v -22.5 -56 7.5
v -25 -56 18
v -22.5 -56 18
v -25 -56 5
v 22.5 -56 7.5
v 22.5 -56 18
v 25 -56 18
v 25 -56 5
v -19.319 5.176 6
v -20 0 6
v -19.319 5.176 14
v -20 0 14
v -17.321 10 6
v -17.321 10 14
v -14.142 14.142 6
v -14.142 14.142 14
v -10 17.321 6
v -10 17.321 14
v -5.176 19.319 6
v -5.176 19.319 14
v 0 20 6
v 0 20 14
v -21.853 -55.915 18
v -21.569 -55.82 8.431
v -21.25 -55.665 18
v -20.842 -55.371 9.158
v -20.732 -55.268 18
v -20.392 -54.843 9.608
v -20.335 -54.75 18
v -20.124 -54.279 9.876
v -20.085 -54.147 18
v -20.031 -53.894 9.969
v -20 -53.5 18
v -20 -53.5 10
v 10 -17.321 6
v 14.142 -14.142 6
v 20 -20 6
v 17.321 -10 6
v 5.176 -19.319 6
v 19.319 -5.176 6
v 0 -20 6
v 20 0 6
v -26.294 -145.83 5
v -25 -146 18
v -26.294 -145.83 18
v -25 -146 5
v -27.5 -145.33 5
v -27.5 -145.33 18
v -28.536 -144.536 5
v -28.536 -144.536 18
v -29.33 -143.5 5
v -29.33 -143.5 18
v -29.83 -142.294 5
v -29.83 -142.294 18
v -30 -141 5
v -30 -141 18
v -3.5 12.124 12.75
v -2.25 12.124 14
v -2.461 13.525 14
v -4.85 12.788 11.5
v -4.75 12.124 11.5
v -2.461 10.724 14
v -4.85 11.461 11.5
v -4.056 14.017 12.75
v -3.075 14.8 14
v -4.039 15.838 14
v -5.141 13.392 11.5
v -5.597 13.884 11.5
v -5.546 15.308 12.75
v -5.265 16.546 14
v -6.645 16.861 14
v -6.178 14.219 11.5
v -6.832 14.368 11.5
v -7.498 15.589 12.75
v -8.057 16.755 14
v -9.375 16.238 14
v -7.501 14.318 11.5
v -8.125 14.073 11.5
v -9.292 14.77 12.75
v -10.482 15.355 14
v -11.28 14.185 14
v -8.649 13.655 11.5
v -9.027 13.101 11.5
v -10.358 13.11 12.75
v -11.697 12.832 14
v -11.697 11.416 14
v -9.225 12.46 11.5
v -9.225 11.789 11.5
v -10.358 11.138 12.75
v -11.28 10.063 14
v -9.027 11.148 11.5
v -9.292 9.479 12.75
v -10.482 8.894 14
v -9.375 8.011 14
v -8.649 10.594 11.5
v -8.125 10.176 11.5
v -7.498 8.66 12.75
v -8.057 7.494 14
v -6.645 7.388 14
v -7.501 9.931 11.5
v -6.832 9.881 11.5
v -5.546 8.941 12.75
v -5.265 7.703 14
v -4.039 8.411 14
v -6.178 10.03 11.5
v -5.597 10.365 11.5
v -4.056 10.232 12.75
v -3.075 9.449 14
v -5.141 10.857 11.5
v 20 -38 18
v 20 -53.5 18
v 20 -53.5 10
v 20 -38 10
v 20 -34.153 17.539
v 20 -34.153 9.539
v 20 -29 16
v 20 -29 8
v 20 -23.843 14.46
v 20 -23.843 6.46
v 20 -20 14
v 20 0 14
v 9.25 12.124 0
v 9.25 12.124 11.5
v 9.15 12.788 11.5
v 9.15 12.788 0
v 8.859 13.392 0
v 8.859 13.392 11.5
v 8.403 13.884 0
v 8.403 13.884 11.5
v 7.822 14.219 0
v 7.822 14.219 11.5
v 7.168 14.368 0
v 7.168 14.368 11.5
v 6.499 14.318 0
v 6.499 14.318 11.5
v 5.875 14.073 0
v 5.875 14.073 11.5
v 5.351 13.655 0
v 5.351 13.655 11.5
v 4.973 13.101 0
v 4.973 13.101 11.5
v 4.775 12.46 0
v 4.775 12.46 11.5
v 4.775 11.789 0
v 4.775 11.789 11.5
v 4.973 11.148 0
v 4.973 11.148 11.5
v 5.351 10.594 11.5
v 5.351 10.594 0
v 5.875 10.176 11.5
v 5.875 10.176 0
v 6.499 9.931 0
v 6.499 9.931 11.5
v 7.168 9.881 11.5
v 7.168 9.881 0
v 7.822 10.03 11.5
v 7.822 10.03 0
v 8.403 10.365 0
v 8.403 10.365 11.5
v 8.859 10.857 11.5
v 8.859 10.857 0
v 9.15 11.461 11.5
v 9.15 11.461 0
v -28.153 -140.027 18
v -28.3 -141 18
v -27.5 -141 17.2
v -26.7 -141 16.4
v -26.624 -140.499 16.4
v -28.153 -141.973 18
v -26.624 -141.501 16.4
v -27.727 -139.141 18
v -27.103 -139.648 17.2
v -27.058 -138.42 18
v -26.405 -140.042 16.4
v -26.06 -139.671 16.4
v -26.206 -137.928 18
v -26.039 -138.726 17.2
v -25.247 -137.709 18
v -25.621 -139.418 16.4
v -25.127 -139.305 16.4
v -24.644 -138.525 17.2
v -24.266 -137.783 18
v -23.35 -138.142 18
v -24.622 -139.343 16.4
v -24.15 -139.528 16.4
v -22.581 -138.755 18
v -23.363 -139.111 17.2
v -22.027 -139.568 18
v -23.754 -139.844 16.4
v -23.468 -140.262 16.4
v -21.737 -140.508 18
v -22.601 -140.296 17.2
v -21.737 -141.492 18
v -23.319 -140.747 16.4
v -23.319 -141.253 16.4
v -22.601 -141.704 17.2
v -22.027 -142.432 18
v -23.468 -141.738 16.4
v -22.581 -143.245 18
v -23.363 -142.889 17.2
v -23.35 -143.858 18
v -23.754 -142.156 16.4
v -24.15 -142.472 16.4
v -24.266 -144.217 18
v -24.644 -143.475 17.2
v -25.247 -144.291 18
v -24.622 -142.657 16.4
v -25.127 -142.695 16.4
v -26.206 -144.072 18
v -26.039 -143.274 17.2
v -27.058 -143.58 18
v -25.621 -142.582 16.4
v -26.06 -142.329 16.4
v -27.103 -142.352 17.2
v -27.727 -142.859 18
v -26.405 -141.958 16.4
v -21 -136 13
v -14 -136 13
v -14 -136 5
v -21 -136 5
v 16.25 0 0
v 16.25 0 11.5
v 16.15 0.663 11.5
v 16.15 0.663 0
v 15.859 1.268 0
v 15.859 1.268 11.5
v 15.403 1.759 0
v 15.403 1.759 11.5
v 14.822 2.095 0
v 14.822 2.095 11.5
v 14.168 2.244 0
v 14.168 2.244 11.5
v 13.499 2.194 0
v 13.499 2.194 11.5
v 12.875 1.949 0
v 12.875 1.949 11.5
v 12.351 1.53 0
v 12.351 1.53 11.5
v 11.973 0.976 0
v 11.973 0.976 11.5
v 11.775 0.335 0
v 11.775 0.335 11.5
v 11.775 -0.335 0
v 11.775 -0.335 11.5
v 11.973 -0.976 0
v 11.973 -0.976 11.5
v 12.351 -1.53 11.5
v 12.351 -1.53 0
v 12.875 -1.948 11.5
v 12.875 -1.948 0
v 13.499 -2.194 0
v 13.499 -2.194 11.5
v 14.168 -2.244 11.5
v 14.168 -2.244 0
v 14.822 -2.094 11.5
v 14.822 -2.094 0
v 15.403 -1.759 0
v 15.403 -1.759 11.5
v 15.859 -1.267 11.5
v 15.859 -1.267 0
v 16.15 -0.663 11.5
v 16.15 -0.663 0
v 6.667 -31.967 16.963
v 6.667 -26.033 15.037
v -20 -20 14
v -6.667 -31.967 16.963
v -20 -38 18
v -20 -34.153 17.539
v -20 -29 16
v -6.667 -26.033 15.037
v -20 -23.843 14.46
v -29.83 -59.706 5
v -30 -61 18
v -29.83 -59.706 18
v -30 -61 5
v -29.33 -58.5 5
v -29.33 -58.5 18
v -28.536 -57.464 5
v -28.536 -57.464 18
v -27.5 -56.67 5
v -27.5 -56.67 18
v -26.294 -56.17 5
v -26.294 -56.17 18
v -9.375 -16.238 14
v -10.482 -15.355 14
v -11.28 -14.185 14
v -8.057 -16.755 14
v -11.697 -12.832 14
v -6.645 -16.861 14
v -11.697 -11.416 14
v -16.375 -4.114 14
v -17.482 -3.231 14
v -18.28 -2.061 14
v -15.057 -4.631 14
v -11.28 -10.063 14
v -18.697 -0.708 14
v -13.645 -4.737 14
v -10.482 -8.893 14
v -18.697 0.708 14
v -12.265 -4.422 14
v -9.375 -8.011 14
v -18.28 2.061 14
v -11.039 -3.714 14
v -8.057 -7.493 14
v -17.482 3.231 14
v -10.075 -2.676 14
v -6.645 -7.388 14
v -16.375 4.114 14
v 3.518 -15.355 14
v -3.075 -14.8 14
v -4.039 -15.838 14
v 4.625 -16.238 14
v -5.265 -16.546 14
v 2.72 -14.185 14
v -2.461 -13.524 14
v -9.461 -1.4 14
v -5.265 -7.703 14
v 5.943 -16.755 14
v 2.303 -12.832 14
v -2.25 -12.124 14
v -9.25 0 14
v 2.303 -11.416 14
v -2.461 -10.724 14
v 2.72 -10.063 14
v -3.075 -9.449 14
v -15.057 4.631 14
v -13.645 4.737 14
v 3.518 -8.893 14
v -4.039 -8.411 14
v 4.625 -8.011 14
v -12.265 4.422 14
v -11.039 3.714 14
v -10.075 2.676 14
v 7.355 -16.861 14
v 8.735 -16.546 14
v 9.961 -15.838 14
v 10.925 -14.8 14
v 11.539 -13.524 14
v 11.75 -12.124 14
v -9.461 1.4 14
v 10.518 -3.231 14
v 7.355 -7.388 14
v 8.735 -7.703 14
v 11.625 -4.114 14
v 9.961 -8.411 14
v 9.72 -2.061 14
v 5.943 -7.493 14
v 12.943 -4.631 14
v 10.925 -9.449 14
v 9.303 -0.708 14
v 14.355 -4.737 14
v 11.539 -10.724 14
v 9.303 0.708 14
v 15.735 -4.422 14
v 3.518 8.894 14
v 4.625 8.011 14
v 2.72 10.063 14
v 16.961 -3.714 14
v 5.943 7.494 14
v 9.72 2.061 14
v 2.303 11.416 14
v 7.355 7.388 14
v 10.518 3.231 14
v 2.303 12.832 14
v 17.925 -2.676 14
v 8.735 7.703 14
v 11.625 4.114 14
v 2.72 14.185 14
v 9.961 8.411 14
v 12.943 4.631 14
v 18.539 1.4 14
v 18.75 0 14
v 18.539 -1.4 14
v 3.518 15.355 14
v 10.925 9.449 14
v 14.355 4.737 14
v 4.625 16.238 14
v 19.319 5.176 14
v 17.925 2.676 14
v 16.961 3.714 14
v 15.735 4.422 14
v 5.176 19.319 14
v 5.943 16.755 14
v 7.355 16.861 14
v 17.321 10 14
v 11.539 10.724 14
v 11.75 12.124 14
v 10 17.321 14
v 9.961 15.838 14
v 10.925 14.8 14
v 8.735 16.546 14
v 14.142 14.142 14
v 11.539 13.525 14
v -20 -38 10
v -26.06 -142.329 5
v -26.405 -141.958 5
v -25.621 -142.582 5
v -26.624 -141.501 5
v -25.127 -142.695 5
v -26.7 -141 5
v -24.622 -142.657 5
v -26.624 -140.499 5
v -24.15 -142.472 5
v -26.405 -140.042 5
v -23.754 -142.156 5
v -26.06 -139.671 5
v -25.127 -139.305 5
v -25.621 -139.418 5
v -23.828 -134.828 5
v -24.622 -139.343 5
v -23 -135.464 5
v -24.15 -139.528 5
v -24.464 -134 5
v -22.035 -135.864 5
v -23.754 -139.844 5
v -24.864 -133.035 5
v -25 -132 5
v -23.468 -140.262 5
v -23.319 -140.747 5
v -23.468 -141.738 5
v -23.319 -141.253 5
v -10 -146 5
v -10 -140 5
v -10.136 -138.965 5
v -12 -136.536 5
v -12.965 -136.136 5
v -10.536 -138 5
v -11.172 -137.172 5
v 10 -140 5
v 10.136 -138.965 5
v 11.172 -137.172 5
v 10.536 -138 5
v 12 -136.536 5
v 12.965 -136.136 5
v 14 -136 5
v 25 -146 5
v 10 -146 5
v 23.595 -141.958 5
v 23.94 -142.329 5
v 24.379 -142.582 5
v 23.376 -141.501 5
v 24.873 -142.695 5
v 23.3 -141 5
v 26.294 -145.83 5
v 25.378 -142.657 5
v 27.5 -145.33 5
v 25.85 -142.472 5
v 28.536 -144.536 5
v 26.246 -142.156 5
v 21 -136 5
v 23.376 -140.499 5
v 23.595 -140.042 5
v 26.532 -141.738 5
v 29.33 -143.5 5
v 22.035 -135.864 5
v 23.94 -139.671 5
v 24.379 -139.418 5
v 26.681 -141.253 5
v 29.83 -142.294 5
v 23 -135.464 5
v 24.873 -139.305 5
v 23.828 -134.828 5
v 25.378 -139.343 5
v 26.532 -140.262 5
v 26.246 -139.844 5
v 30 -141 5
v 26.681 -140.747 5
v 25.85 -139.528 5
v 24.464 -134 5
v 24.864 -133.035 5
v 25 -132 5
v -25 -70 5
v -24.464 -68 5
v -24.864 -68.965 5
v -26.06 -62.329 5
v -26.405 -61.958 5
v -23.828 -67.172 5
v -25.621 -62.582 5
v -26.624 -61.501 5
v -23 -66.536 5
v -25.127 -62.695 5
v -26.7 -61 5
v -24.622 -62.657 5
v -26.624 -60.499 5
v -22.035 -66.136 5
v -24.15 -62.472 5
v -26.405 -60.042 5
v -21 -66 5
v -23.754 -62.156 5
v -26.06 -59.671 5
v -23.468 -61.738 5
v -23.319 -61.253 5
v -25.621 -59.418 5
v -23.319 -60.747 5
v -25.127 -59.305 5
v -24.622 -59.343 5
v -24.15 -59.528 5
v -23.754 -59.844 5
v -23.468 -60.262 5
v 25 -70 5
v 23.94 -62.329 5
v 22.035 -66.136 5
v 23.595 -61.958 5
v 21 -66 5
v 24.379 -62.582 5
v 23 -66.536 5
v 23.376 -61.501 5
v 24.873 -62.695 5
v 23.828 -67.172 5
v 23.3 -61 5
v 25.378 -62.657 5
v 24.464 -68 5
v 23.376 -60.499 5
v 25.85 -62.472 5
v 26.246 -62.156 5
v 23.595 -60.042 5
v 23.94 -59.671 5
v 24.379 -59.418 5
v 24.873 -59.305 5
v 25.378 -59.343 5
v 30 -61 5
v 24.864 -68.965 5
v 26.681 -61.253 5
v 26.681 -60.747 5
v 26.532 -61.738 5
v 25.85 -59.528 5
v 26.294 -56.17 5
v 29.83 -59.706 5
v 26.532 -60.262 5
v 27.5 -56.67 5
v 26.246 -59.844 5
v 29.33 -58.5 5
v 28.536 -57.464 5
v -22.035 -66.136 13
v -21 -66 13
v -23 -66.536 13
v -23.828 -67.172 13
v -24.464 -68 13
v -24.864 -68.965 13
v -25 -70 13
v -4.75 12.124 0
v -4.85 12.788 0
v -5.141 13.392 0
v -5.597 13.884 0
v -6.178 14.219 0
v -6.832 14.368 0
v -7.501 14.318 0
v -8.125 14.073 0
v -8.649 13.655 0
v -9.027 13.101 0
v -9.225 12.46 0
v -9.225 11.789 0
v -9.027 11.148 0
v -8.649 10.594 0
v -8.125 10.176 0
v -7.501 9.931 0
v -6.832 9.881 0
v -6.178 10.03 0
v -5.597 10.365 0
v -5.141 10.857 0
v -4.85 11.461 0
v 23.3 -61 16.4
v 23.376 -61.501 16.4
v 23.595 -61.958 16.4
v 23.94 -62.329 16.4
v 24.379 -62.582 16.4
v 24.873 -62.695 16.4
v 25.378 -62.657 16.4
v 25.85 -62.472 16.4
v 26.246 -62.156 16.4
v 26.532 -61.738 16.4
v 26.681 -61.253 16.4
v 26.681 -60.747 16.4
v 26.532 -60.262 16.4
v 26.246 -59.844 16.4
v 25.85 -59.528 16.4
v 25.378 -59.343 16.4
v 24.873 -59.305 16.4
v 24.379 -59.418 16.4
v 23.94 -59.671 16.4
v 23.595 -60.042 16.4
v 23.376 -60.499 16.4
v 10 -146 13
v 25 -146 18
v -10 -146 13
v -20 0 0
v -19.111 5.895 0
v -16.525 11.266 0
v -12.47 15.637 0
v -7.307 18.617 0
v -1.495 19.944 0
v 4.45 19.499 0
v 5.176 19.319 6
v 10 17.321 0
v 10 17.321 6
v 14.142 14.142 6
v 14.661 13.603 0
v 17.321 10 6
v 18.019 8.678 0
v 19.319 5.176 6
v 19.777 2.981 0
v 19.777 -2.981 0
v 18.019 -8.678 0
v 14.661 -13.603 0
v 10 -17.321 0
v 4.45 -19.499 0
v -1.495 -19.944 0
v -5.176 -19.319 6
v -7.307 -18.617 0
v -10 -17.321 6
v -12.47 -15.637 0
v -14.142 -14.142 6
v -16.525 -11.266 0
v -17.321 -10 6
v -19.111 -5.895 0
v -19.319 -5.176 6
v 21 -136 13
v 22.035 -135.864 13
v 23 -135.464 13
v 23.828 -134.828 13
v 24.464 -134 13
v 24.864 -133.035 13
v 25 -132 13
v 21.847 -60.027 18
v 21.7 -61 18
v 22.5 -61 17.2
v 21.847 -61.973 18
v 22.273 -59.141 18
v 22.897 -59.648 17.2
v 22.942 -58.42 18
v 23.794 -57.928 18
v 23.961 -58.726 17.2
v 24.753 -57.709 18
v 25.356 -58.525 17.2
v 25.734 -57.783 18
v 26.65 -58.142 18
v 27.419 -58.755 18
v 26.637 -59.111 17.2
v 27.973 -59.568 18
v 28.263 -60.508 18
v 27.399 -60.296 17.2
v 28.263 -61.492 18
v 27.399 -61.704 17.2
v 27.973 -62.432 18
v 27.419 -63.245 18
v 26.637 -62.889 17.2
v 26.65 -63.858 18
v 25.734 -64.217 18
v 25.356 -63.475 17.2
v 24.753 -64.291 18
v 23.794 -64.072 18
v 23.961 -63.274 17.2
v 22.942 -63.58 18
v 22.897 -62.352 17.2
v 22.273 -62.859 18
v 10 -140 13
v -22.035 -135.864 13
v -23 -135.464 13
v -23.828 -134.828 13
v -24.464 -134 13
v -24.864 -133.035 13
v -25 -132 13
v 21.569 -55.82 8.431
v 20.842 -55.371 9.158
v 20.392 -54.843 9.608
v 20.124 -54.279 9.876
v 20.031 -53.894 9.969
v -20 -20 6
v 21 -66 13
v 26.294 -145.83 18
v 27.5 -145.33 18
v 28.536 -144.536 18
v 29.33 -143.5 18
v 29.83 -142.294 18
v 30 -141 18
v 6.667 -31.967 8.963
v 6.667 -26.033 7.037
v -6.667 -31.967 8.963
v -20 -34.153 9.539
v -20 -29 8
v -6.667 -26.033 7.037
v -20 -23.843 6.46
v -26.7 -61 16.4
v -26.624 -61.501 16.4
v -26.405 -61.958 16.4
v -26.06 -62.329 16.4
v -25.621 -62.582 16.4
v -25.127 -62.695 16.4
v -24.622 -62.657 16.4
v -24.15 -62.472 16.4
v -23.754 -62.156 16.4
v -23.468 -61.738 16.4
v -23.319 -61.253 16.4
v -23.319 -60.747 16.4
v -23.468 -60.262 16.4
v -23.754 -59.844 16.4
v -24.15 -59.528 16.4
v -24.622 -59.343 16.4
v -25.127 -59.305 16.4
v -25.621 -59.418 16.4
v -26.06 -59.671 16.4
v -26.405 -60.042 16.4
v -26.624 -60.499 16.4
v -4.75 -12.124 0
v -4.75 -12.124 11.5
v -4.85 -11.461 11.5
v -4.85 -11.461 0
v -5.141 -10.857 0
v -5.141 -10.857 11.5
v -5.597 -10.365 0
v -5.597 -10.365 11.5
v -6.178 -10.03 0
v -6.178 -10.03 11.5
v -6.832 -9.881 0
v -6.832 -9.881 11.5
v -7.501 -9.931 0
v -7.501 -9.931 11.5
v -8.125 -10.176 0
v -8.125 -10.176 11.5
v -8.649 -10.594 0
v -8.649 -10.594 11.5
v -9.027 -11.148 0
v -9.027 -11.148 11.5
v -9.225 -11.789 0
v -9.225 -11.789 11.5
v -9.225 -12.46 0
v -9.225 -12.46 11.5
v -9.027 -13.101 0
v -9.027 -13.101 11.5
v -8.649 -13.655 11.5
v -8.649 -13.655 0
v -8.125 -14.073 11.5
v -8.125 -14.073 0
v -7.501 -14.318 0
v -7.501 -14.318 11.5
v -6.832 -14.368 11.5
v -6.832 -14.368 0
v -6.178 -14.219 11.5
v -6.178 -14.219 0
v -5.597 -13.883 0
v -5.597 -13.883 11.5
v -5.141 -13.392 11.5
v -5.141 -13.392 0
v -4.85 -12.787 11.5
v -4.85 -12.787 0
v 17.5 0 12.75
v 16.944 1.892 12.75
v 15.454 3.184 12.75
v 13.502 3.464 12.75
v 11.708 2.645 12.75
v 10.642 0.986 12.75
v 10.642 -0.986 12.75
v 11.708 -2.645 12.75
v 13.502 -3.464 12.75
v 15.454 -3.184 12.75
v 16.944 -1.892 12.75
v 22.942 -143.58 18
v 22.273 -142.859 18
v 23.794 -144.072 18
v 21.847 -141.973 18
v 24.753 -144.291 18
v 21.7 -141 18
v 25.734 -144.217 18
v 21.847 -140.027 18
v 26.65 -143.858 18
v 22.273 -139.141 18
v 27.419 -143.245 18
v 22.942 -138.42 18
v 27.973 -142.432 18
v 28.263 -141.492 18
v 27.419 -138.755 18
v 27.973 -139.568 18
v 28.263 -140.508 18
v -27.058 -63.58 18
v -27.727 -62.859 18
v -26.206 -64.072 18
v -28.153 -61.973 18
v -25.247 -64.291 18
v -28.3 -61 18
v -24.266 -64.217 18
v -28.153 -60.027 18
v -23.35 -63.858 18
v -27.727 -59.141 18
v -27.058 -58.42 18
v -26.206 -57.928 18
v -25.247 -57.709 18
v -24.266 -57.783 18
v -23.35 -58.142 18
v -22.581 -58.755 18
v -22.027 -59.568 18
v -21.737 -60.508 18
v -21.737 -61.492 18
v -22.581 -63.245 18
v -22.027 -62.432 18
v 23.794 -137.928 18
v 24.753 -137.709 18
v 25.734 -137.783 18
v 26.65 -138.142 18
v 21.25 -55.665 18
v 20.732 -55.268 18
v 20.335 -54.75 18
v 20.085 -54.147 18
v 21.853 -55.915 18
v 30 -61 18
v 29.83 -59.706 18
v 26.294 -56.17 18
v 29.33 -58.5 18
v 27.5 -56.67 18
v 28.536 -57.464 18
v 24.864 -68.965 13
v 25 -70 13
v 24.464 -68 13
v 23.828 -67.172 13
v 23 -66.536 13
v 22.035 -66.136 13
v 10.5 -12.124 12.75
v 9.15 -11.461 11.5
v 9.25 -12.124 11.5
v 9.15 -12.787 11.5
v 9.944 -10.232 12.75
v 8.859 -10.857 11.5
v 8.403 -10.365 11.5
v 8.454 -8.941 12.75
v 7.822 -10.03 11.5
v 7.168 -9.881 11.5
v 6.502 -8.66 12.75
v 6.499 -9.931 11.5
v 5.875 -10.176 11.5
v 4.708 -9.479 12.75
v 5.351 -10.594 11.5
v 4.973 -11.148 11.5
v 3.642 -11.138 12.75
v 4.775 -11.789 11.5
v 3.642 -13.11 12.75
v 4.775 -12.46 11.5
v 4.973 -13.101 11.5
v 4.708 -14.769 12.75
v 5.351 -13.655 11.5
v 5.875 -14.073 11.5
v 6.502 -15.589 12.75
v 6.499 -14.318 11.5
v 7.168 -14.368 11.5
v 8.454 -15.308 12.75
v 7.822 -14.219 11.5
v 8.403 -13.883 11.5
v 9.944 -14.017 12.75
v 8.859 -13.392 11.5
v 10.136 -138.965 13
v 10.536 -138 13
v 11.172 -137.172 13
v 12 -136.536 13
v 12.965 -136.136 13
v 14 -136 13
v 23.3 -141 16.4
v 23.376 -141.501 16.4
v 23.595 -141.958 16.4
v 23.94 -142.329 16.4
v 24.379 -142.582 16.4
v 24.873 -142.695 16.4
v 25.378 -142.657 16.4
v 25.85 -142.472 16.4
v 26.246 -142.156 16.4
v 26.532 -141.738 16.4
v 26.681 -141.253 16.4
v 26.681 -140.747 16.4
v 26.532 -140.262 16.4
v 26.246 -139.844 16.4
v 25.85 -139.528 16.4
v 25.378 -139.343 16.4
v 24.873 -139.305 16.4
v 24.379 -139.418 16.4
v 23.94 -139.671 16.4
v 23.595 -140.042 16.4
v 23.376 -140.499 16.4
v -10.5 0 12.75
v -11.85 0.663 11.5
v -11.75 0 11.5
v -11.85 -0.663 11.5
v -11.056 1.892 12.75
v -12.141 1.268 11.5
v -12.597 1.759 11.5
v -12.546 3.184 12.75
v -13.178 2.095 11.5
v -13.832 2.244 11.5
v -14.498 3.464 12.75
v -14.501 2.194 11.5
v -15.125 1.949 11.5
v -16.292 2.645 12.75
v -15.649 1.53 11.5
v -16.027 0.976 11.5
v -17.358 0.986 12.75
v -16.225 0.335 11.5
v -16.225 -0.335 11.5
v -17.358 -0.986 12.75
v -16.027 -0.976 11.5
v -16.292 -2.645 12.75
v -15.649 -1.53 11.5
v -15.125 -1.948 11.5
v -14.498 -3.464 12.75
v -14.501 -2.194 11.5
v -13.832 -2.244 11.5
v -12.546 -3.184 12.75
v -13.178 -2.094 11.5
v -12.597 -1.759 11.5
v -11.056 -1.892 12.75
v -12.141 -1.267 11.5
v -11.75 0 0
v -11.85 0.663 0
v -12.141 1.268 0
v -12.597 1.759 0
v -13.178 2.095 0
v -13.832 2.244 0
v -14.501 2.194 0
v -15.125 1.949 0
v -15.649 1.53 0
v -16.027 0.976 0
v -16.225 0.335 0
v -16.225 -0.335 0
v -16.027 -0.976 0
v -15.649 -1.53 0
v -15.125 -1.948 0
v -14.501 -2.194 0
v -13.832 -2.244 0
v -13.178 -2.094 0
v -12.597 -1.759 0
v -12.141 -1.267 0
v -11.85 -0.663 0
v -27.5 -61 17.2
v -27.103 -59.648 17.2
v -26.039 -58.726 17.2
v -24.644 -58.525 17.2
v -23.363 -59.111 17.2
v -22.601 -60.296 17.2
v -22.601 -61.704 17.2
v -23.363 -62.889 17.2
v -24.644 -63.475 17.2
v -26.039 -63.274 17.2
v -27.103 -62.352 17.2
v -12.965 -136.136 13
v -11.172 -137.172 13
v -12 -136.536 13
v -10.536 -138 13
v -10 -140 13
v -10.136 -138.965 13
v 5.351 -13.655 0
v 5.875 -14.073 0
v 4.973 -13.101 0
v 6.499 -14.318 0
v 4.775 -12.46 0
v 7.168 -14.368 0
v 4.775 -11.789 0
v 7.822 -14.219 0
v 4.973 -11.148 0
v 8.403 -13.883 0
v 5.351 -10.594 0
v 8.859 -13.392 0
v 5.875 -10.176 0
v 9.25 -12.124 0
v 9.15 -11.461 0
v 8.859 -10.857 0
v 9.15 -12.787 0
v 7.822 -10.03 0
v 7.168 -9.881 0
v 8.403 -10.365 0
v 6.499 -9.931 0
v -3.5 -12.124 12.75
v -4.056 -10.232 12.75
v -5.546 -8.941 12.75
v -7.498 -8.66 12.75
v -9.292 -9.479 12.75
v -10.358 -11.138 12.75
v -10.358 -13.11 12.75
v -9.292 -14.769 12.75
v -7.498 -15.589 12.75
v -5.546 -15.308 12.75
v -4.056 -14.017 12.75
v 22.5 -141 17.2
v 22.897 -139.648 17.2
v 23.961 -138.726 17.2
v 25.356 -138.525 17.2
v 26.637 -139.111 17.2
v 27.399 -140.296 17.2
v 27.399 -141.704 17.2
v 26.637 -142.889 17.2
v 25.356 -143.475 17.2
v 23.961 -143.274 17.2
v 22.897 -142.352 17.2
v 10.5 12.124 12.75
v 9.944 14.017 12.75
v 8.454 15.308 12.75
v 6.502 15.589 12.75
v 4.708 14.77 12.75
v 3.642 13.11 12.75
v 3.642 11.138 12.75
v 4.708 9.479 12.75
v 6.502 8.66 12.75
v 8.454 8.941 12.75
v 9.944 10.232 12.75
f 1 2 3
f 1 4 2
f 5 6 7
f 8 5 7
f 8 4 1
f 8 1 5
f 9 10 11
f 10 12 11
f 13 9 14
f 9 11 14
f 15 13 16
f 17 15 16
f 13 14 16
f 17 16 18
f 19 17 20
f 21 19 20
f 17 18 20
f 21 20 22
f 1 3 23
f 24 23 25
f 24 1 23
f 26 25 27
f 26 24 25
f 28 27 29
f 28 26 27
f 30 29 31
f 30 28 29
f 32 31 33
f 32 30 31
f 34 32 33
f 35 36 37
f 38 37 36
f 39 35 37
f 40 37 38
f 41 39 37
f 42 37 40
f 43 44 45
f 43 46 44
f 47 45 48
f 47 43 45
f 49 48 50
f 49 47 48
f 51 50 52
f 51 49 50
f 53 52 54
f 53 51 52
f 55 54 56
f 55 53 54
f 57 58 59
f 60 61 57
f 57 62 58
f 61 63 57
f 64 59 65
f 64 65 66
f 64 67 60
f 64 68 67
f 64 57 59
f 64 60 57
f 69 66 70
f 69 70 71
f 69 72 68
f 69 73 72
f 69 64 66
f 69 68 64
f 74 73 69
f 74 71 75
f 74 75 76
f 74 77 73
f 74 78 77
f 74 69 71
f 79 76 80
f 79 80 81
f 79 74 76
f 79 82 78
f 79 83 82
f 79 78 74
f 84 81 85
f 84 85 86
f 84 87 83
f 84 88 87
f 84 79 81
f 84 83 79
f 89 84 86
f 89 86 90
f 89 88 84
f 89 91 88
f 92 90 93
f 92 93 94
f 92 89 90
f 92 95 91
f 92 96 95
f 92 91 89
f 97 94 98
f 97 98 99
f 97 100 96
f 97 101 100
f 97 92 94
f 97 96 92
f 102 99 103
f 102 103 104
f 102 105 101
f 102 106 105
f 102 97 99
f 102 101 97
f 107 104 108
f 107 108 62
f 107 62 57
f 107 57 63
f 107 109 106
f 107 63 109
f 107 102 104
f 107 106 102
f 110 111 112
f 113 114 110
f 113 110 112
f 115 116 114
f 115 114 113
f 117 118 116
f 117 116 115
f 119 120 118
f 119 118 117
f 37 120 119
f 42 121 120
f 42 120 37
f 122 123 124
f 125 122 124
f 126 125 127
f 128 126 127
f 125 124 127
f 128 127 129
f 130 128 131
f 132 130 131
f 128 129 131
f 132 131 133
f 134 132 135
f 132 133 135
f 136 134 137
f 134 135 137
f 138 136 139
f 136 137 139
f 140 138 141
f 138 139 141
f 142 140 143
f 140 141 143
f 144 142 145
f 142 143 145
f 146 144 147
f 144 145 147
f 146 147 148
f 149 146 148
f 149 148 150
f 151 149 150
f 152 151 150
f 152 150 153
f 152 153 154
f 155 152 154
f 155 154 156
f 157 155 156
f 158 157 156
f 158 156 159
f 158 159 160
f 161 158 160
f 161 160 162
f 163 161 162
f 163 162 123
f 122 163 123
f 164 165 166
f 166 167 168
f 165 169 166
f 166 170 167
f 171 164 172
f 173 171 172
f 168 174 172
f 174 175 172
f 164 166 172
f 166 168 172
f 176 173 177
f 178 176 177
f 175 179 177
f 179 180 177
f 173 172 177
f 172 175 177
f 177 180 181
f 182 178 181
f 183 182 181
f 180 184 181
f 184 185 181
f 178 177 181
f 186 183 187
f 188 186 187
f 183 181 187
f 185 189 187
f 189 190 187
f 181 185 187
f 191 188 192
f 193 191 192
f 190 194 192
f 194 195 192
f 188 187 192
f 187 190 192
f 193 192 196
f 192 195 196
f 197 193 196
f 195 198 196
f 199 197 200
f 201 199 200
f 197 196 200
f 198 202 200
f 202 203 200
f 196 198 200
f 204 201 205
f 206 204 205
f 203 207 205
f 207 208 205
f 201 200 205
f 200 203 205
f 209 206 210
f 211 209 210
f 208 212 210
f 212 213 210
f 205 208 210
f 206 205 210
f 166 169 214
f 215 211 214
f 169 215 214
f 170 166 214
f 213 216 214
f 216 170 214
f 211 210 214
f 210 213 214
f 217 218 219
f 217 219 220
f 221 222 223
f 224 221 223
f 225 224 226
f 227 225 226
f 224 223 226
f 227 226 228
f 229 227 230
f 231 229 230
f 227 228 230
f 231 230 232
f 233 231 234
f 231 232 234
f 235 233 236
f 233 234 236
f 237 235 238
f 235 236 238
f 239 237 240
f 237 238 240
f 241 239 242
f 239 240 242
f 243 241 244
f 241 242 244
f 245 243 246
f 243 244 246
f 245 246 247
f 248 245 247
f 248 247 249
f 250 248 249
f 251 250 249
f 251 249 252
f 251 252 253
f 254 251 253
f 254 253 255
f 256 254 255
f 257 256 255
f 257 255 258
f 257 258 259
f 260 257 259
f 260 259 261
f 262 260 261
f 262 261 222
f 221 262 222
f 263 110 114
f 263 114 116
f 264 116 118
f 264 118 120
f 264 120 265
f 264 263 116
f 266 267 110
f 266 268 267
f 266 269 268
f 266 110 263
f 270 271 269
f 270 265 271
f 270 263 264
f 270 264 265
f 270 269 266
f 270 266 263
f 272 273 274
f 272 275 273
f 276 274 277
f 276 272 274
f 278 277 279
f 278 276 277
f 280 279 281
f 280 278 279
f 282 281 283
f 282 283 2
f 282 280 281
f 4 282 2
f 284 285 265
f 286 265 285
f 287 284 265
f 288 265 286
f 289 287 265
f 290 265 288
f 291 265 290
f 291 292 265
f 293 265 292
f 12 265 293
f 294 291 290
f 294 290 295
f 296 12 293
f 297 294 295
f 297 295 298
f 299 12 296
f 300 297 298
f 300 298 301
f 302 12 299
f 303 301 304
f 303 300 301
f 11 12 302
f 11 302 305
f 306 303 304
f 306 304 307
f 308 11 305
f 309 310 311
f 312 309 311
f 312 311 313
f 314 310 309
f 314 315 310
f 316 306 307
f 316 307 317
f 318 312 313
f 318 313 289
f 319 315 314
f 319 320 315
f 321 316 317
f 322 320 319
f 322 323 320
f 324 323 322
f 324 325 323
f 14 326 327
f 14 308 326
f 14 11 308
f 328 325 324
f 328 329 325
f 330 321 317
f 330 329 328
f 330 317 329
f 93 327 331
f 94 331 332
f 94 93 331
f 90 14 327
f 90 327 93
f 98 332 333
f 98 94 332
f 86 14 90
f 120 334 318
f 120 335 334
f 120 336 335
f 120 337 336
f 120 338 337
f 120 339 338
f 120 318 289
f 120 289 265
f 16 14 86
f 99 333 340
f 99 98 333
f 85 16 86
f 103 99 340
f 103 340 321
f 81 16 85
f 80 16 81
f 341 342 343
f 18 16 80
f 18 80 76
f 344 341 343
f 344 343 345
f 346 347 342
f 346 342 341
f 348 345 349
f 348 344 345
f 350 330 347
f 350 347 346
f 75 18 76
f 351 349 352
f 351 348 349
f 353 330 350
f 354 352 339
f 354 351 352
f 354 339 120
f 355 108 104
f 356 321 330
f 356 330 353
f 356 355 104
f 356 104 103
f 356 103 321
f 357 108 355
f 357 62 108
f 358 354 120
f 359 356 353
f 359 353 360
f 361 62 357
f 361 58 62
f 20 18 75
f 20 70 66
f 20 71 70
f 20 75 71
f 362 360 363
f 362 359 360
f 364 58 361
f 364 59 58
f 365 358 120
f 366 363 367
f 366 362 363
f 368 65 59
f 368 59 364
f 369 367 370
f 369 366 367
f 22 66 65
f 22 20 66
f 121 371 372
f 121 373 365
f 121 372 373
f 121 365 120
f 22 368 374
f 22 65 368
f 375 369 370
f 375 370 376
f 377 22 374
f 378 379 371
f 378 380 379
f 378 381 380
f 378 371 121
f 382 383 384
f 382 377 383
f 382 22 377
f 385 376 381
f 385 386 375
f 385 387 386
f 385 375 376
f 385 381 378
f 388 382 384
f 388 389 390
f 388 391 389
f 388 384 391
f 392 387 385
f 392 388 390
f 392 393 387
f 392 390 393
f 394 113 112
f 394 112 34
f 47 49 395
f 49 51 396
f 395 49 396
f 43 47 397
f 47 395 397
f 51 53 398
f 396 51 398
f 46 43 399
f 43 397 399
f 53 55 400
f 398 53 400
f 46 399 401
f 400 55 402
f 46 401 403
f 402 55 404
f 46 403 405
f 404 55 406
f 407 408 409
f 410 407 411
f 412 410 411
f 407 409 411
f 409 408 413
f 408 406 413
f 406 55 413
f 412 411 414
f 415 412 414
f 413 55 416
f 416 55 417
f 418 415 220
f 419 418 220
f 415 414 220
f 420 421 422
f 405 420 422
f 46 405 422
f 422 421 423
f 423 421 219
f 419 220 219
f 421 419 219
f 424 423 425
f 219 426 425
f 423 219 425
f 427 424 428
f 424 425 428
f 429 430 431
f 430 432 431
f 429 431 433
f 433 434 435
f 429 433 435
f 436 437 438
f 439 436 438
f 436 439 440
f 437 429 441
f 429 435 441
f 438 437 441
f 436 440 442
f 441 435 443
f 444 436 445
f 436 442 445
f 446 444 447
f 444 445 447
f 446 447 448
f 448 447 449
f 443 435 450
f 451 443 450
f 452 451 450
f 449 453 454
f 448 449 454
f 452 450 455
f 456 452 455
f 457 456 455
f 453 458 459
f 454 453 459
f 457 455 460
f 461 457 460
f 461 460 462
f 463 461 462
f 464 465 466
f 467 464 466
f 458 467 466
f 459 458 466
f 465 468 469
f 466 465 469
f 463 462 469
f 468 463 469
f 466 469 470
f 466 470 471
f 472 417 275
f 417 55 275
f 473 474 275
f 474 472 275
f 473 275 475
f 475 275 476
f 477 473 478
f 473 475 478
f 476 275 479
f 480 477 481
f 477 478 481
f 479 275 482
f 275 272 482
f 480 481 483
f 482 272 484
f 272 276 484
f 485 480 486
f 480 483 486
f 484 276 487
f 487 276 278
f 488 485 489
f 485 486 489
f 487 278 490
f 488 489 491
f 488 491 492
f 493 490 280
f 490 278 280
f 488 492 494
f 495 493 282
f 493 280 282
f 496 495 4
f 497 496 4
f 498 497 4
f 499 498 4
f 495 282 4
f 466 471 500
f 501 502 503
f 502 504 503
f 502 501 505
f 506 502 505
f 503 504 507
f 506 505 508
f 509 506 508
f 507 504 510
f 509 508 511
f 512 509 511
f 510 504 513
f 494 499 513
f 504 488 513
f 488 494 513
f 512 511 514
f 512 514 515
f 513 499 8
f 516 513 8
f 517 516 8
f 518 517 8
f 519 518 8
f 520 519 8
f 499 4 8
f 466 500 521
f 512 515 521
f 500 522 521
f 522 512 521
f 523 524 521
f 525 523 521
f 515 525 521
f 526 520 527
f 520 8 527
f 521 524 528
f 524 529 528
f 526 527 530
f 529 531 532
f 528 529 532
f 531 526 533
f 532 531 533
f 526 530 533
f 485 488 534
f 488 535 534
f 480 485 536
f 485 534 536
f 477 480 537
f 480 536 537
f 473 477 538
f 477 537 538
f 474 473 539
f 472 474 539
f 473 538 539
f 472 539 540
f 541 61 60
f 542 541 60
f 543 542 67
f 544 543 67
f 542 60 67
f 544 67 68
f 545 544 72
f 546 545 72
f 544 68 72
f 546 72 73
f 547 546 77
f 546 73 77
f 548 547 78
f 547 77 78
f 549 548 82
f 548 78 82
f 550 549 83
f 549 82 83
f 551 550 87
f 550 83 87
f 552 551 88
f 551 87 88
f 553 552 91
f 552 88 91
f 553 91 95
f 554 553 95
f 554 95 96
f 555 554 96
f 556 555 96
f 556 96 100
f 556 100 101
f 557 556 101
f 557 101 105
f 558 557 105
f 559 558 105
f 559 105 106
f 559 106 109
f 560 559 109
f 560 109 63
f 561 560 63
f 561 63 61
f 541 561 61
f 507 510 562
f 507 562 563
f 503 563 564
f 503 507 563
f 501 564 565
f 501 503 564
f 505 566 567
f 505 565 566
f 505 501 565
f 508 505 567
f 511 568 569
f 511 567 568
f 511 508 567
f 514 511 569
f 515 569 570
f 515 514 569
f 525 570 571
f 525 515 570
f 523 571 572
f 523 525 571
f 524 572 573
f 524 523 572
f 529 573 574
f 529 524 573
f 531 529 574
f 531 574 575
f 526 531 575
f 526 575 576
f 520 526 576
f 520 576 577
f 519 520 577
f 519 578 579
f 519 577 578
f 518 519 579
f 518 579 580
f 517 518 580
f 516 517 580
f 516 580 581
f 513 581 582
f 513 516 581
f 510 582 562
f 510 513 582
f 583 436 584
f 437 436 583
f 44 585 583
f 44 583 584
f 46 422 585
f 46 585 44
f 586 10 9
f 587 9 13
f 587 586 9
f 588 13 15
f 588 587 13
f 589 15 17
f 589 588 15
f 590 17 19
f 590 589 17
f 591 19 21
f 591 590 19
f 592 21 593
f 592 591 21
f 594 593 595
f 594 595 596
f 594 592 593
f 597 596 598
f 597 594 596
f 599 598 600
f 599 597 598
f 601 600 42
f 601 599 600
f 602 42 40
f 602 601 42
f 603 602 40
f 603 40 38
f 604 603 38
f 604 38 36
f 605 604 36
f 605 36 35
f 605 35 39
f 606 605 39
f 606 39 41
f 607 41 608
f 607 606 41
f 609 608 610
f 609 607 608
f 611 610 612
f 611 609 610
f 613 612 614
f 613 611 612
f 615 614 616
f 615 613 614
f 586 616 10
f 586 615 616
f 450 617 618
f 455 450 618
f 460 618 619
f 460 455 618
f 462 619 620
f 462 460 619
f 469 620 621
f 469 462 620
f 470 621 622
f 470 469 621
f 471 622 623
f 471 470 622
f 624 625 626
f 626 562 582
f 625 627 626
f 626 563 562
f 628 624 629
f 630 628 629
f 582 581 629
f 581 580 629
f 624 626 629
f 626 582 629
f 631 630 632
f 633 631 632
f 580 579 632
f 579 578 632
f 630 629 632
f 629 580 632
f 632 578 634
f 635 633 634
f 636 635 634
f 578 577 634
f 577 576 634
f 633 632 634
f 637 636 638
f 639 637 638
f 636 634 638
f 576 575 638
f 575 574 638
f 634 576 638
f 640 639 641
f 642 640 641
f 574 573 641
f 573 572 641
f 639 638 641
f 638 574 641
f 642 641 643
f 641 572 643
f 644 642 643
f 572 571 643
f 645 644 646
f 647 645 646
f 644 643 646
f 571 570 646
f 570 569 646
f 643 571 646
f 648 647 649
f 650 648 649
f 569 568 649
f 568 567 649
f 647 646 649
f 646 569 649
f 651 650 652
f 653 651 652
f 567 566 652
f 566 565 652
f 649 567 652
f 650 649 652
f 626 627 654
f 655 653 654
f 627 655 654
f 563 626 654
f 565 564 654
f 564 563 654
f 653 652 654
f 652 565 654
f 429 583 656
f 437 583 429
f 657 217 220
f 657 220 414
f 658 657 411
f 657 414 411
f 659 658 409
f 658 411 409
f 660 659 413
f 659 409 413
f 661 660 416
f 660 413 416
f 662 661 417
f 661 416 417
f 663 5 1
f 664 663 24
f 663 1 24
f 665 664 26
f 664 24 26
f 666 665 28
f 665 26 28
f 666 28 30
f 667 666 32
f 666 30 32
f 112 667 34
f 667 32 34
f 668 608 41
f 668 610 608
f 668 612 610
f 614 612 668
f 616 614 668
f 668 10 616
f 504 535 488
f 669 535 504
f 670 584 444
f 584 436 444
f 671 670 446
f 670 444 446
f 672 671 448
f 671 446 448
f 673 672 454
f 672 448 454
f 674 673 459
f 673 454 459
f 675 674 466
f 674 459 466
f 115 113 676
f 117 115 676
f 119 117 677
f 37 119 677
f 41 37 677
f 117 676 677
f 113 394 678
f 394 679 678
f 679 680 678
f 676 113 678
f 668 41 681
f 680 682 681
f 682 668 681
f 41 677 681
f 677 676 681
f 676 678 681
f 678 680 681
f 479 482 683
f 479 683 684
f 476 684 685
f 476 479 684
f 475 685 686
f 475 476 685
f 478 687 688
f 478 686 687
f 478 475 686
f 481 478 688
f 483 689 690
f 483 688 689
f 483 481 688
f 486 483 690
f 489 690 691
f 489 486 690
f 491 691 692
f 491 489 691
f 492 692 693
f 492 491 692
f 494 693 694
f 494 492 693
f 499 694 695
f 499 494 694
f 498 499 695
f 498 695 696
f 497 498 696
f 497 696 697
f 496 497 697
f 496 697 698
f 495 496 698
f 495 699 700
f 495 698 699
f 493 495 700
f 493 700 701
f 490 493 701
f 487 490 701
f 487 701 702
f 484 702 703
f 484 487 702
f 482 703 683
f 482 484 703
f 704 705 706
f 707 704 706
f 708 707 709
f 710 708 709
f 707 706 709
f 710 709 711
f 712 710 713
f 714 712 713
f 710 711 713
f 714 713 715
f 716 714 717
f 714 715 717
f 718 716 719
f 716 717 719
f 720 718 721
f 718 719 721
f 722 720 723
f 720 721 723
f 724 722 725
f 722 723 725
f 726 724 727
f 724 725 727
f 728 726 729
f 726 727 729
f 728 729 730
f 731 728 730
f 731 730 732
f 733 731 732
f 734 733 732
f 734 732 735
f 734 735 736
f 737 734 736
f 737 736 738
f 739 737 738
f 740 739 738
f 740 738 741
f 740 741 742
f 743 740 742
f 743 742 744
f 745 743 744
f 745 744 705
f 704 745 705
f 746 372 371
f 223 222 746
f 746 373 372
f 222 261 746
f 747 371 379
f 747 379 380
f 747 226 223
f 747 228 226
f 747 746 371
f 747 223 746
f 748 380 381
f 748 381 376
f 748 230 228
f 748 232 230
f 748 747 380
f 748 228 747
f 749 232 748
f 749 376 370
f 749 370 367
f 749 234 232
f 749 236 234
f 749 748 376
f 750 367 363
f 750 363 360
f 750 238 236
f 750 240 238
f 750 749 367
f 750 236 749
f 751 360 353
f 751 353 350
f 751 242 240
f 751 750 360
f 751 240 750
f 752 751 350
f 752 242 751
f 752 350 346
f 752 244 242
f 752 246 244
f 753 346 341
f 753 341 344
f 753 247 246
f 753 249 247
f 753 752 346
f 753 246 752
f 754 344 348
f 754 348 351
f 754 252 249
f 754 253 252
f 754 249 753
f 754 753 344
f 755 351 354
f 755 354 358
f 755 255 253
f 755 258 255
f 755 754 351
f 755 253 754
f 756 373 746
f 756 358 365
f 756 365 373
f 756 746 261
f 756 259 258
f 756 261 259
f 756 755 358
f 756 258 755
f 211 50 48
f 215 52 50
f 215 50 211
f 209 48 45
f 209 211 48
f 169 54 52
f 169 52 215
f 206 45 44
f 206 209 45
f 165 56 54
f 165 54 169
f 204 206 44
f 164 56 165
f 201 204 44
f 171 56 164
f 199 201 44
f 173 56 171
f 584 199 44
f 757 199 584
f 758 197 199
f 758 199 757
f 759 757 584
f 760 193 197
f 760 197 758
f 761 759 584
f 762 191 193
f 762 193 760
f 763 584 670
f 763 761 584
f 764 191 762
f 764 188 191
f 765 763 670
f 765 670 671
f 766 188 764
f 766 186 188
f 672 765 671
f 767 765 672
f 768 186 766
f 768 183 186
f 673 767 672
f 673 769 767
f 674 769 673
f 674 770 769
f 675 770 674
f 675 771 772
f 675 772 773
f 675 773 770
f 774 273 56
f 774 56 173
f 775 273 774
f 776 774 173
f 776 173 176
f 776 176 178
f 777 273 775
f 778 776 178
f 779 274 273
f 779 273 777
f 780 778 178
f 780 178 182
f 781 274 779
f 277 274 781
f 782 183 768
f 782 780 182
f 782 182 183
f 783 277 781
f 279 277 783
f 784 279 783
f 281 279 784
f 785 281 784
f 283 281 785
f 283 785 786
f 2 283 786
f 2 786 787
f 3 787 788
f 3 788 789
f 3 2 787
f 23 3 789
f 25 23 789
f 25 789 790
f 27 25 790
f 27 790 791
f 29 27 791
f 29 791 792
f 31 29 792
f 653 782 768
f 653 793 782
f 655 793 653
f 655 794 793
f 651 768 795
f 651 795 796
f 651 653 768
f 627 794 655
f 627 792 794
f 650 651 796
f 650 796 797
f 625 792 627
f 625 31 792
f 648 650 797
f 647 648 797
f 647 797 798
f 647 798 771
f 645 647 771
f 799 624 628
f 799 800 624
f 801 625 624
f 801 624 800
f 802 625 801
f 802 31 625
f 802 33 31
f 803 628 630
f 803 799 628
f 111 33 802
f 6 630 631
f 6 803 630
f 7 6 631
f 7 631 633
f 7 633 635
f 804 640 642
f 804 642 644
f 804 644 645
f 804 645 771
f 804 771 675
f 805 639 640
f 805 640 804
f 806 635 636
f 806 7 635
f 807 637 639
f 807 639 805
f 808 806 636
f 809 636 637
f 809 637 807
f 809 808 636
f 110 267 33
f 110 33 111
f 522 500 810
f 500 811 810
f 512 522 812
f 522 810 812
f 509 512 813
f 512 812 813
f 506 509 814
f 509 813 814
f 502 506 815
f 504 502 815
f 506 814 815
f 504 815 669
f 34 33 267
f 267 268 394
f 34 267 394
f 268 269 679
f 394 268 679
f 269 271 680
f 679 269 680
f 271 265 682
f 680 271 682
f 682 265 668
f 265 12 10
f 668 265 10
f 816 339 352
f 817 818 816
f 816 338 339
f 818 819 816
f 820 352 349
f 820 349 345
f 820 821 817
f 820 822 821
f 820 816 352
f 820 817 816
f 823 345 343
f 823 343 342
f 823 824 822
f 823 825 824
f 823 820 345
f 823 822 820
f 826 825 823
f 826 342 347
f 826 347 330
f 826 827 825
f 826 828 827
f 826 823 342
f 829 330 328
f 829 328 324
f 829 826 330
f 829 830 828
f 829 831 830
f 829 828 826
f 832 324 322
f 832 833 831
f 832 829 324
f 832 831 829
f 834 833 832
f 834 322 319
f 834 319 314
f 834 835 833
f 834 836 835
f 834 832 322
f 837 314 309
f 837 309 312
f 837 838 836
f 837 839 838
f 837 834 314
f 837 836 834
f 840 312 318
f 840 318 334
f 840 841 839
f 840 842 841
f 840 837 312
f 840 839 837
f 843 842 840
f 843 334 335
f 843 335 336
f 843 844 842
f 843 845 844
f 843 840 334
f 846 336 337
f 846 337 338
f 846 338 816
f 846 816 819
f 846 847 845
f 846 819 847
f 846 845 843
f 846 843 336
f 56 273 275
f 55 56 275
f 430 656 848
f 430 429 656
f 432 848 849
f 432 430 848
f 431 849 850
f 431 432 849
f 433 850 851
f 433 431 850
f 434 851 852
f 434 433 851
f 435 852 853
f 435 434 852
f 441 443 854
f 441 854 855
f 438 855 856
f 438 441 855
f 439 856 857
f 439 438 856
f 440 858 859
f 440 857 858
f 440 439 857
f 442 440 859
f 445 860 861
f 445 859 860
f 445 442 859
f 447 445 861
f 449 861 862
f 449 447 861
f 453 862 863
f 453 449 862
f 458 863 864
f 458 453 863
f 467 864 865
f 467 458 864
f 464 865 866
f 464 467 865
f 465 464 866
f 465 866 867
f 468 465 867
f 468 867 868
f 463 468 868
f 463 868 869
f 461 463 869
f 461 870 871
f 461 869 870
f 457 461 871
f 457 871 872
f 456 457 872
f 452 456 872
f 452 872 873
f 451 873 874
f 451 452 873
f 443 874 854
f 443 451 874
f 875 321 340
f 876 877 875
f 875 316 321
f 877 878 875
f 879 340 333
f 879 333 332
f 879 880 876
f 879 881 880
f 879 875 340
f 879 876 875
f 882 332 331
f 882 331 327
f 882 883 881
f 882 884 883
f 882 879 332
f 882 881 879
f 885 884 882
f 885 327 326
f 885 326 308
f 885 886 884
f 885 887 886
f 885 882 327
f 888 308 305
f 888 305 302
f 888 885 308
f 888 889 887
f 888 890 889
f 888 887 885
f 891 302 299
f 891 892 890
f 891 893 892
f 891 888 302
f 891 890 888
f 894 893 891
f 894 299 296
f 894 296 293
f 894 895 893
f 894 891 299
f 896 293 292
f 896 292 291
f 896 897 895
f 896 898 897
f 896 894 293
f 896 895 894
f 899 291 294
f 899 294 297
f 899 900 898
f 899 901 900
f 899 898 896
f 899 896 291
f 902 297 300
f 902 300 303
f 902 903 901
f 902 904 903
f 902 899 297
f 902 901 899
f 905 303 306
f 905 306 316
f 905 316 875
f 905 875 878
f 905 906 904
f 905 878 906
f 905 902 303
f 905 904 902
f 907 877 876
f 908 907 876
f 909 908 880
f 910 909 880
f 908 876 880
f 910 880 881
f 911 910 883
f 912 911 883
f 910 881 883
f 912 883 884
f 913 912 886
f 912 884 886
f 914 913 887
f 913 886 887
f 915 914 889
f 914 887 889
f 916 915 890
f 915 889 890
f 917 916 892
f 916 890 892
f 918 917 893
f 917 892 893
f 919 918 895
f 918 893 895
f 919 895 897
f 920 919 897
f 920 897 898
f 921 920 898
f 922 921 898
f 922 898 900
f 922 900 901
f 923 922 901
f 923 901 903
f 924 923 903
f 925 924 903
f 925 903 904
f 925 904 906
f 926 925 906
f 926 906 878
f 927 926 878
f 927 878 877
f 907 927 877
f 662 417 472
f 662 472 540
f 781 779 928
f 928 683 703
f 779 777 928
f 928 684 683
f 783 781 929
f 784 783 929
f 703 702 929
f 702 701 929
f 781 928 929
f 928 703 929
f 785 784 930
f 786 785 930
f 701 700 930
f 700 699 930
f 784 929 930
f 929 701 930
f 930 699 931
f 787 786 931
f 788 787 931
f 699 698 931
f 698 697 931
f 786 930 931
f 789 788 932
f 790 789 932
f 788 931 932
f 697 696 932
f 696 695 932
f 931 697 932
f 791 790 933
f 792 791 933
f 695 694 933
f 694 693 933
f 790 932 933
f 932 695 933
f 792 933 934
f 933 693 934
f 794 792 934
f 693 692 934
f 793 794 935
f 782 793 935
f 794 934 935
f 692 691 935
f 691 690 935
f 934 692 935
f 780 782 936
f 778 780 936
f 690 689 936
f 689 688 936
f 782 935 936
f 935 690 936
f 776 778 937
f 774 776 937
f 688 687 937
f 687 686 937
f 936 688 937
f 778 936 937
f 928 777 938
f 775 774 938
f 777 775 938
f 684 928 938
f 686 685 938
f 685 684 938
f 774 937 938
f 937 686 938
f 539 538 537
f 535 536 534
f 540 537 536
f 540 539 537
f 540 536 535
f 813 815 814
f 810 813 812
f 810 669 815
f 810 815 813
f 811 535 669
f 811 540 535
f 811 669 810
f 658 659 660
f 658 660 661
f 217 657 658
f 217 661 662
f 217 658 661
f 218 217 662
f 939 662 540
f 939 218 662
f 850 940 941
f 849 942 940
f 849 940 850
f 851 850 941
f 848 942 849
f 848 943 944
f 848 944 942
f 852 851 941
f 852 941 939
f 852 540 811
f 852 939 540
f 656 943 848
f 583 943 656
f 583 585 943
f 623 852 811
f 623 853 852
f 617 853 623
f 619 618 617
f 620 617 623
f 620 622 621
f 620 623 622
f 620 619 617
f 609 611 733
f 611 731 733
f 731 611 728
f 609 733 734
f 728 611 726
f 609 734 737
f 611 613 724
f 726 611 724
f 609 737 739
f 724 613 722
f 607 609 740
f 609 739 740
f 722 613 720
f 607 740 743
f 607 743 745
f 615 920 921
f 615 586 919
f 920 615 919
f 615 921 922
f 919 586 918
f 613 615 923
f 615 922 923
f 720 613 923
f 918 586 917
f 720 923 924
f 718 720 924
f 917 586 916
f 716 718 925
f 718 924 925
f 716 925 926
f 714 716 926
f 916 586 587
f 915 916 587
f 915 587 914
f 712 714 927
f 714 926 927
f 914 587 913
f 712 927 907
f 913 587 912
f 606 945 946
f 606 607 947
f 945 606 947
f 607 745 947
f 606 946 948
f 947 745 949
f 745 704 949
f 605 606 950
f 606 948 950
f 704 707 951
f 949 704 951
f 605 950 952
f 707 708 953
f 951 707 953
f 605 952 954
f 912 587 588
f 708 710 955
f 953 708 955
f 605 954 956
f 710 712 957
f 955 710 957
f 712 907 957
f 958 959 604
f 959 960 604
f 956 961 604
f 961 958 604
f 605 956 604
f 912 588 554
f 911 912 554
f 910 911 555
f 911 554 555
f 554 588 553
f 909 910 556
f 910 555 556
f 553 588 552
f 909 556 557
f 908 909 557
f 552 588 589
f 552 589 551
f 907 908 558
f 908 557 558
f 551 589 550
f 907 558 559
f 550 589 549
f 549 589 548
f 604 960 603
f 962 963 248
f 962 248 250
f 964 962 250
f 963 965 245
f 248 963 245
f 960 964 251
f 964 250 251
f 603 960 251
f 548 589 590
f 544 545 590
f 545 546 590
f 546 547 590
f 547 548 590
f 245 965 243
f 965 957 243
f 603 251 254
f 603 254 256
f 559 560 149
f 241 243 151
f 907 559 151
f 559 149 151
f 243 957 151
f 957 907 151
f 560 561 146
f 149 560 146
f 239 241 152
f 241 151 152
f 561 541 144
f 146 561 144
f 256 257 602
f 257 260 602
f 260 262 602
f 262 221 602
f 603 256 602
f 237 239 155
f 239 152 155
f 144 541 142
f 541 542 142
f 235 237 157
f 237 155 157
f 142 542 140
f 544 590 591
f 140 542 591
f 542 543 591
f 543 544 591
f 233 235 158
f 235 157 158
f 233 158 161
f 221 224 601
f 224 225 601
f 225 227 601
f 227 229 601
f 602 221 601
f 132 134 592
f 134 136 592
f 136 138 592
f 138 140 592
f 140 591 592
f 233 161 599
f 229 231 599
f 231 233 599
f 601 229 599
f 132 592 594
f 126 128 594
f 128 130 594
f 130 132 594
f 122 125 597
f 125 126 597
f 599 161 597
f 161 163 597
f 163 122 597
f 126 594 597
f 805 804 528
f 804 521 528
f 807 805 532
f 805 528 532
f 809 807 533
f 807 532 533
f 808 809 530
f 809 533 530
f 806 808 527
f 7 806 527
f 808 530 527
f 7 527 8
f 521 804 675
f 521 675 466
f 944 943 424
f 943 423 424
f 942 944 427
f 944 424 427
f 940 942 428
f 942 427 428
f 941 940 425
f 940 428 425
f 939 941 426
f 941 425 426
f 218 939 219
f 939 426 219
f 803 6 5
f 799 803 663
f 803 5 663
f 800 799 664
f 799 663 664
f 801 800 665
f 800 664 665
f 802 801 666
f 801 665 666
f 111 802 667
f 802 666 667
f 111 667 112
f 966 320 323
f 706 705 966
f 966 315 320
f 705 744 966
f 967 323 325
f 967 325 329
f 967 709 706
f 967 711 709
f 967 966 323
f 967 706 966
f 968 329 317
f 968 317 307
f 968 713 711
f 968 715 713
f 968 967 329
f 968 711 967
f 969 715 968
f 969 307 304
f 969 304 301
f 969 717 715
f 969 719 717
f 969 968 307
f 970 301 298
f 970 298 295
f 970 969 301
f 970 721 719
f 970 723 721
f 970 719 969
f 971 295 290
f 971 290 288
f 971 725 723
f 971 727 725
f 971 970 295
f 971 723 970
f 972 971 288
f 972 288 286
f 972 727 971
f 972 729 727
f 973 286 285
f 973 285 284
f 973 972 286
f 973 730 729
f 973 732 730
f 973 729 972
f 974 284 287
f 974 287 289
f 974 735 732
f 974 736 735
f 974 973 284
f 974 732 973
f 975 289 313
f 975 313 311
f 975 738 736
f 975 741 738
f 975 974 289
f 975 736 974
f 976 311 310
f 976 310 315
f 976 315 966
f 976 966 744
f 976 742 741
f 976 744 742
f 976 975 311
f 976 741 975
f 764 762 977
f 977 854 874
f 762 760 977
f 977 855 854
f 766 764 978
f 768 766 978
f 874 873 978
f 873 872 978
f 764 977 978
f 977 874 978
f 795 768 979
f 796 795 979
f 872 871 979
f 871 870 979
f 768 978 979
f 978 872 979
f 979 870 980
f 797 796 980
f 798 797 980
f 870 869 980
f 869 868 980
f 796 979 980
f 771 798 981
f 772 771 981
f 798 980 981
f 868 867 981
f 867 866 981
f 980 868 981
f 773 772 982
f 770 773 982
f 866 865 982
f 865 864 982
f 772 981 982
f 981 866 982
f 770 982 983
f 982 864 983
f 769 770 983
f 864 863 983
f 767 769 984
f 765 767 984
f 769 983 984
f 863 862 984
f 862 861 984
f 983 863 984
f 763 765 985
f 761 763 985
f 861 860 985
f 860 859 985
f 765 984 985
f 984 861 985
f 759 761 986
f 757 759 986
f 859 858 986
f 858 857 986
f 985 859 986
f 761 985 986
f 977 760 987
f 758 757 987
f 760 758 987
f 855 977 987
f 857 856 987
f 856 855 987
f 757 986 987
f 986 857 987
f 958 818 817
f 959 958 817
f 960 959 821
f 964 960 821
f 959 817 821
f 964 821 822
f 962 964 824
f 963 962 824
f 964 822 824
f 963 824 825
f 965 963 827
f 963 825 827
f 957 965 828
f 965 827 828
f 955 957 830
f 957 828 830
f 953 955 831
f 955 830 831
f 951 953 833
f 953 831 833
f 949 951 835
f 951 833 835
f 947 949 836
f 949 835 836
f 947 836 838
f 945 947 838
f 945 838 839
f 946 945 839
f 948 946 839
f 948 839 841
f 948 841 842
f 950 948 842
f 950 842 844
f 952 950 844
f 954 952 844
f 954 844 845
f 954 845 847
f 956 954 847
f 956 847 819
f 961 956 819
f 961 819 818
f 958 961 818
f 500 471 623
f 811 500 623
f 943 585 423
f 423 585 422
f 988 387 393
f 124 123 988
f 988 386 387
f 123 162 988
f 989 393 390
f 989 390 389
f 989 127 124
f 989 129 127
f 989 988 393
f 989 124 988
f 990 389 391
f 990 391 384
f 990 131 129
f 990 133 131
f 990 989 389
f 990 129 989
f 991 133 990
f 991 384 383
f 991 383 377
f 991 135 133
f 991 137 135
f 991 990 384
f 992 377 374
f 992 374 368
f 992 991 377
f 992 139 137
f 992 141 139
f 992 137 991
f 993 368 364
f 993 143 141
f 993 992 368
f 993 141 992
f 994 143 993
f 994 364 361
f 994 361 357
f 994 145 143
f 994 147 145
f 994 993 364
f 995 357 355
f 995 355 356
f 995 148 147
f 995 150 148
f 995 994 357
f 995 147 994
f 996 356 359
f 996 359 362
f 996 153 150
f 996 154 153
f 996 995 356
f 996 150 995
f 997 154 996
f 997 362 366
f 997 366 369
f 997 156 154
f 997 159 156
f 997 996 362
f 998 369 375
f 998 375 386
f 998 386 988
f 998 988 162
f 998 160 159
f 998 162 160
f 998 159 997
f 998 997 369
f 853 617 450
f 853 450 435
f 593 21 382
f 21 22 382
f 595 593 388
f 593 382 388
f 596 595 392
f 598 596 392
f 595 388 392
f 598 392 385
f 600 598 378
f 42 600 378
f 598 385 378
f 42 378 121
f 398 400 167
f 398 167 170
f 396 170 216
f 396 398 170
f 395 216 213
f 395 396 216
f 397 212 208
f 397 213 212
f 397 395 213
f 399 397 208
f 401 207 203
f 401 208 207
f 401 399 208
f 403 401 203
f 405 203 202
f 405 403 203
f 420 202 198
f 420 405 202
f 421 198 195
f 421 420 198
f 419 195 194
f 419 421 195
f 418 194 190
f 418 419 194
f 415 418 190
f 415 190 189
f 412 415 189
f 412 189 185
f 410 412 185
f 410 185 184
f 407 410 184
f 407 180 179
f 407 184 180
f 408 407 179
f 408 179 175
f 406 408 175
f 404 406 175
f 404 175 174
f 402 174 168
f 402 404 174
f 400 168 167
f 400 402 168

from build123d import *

# Parameters (mm, degrees)
SKETCH7_W           = 40
SKETCH7_H           = 40
BOSS_EXTRUDE1_DEPTH = 14
LOFT1_START         = -20
LOFT1_DEPTH         = 40
SKETCH16_W          = 49.026286786
SKETCH16_H          = 65.242270374
SKETCH16_R          = 20
CUT_EXTRUDE3_DEPTH  = 6
SKETCH17_W          = 40
SKETCH17_H          = 8
BOSS_EXTRUDE5_DEPTH = 18
SKETCH10_R          = 2.25
CUT_EXTRUDE1_DEPTH  = 25
CHAMFER1_SIZE       = 2.5
FILLET3_R           = 20
SKETCH11_W          = 60
SKETCH11_H          = 18
BOSS_EXTRUDE6_DEPTH = 90
FILLET9_R           = 2.5
SKETCH20_W          = 50
SKETCH20_H          = 8
CUT_EXTRUDE4_DEPTH  = 80
SKETCH28_W          = 15
SKETCH28_H          = 8
BOSS_EXTRUDE7_DEPTH = 10
FILLET13_R          = 4
SKETCH37_W          = 60
SKETCH37_H          = 90
CUT_EXTRUDE8_DEPTH  = 5
FILLET16_R          = 5
SKETCH38_R          = 1.7
CUT_EXTRUDE9_DEPTH  = 22
CHAMFER3_SIZE       = 1.6


# Read off the part's stored shape, not the designer's step: Loft1
with BuildPart() as part:
    # Sketch7 → Boss-Extrude1 (new body)
    with BuildSketch(Plane.XY):
        Rectangle(SKETCH7_W, SKETCH7_H)
    extrude(amount=BOSS_EXTRUDE1_DEPTH)

    # Loft1 outline → Loft1 (add)
    with BuildSketch(Plane.YZ.offset(LOFT1_START)):
        with BuildLine():
            add(Edge.make_bspline(
                [(-38, 18), (-31.853637028, 18), (-26.146362972, 14), (-20, 14)],
                knots=[0, 0, 0, 0, 1, 1, 1, 1], degree=3))
            Line((-38, 18), (-38, 10))
            add(Edge.make_bspline(
                [(-38, 10), (-31.853637028, 10), (-26.146362972, 6), (-20, 6)],
                knots=[0, 0, 0, 0, 1, 1, 1, 1], degree=3))
            Line((-20, 6), (-20, 14))
        make_face()
    extrude(amount=LOFT1_DEPTH)

    # Sketch16 → Cut-Extrude3 (cut)
    with BuildSketch(Plane(origin=(0, 0, 0), x_dir=(-1, 0, 0), z_dir=(0, 0, -1))):
        Rectangle(SKETCH16_W, SKETCH16_H)
        Circle(SKETCH16_R, mode=Mode.SUBTRACT)
    extrude(amount=-CUT_EXTRUDE3_DEPTH, mode=Mode.SUBTRACT)

    # Sketch17 → Boss-Extrude5 (add)
    with BuildSketch(Plane(origin=(0, -38, 0), x_dir=(-1, 0, 0), z_dir=(0, -1, 0))):
        with Locations((0, -14)):
            Rectangle(SKETCH17_W, SKETCH17_H)
    extrude(amount=BOSS_EXTRUDE5_DEPTH)

    # Sketch10 → Cut-Extrude1 (cut)
    with BuildSketch(Plane.XY.offset(14)):
        with Locations((-7.00009521, 12.124420806)):
            Circle(SKETCH10_R)
        with Locations((6.99990479, 12.124420806)):
            Circle(SKETCH10_R)
        with Locations((13.99990479, 6.5153e-05)):
            Circle(SKETCH10_R)
        with Locations((6.99990479, -12.1242905)):
            Circle(SKETCH10_R)
        with Locations((-7.00009521, -12.1242905)):
            Circle(SKETCH10_R)
        with Locations((-14.00009521, 6.5153e-05)):
            Circle(SKETCH10_R)
    extrude(amount=-CUT_EXTRUDE1_DEPTH, mode=Mode.SUBTRACT)

    # Chamfer1
    chamfer1_edges = [part.edges().sort_by_distance(p)[0] for p in [
        (4.74990479, 12.124420806, 14),
        (-9.25009521, 12.124420806, 14),
        (-16.25009521, 6.5153e-05, 14),
        (-9.25009521, -12.1242905, 14),
        (4.74990479, -12.1242905, 14),
        (11.74990479, 6.5153e-05, 14),
    ]]
    chamfer(chamfer1_edges, length=CHAMFER1_SIZE)

    # Fillet3
    fillet3_edges = [part.edges().sort_by_distance(p)[0] for p in [
        (20, 20, 10),
        (-20, 20, 10),
    ]]
    fillet(fillet3_edges, radius=FILLET3_R - 0.0001)  # a hair under: the kernel refuses the full size

    # Sketch11 → Boss-Extrude6 (add)
    with BuildSketch(Plane(origin=(0, -56, -3.472963553), x_dir=(1, 0, 0), z_dir=(0, 1, 0))):
        with Locations((0, -12.472963553)):
            Rectangle(SKETCH11_W, SKETCH11_H)
    extrude(amount=-BOSS_EXTRUDE6_DEPTH)

    # Fillet9
    fillet9_edges = [part.edges().sort_by_distance(p)[0] for p in [
        (0, -56, 10),
        (-20, -56, 14),
        (20, -56, 14),
    ]]
    fillet(fillet9_edges, radius=FILLET9_R)

    # Sketch20 → Cut-Extrude4 (cut)
    with BuildSketch(Plane.XZ.offset(146)):
        with Locations((0, 9)):
            Rectangle(SKETCH20_W, SKETCH20_H)
    extrude(amount=-CUT_EXTRUDE4_DEPTH, mode=Mode.SUBTRACT)

    # Sketch28 → Boss-Extrude7 (add)
    with BuildSketch(Plane(origin=(0, -146, 0), x_dir=(-1, 0, 0), z_dir=(0, -1, 0))):
        with Locations((17.5, -9)):
            Rectangle(SKETCH28_W, SKETCH28_H)
        with Locations((-17.5, -9)):
            Rectangle(SKETCH28_W, SKETCH28_H)
    extrude(amount=-BOSS_EXTRUDE7_DEPTH)

    # Fillet13
    fillet13_edges = [part.edges().sort_by_distance(p)[0] for p in [
        (-25, -66, 9),
        (25, -66, 9),
        (-25, -136, 9),
        (-10, -136, 9),
        (10, -136, 9),
        (25, -136, 9),
    ]]
    fillet(fillet13_edges, radius=FILLET13_R)

    # Sketch37 → Cut-Extrude8 (cut)
    with BuildSketch(Plane.XY):
        with Locations((0, -101)):
            Rectangle(SKETCH37_W, SKETCH37_H)
    extrude(amount=CUT_EXTRUDE8_DEPTH, mode=Mode.SUBTRACT)

    # Fillet16
    fillet16_edges = [part.edges().sort_by_distance(p)[0] for p in [
        (30, -56, 11.5),
        (30, -146, 11.5),
        (-30, -146, 11.5),
        (-30, -56, 11.5),
    ]]
    fillet(fillet16_edges, radius=FILLET16_R)

    # Sketch38 → Cut-Extrude9 (cut)
    with BuildSketch(Plane.XY):
        with Locations(Location((25, -61, 0), (0, 0, 180))):
            Circle(SKETCH38_R)
        with Locations(Location((-25, -61, 0), (0, 0, 180))):
            Circle(SKETCH38_R)
        with Locations(Location((-25, -141, 0), (0, 0, 180))):
            Circle(SKETCH38_R)
        with Locations(Location((25, -141, 0), (0, 0, 180))):
            Circle(SKETCH38_R)
    extrude(amount=CUT_EXTRUDE9_DEPTH, mode=Mode.SUBTRACT)

    # Chamfer3
    chamfer3_edges = [part.edges().sort_by_distance(p)[0] for p in [
        (26.7, -141, 18),
        (-23.3, -141, 18),
        (-23.3, -61, 18),
        (26.7, -61, 18),
    ]]
    chamfer(chamfer3_edges, length=CHAMFER3_SIZE)


solid = part.part
